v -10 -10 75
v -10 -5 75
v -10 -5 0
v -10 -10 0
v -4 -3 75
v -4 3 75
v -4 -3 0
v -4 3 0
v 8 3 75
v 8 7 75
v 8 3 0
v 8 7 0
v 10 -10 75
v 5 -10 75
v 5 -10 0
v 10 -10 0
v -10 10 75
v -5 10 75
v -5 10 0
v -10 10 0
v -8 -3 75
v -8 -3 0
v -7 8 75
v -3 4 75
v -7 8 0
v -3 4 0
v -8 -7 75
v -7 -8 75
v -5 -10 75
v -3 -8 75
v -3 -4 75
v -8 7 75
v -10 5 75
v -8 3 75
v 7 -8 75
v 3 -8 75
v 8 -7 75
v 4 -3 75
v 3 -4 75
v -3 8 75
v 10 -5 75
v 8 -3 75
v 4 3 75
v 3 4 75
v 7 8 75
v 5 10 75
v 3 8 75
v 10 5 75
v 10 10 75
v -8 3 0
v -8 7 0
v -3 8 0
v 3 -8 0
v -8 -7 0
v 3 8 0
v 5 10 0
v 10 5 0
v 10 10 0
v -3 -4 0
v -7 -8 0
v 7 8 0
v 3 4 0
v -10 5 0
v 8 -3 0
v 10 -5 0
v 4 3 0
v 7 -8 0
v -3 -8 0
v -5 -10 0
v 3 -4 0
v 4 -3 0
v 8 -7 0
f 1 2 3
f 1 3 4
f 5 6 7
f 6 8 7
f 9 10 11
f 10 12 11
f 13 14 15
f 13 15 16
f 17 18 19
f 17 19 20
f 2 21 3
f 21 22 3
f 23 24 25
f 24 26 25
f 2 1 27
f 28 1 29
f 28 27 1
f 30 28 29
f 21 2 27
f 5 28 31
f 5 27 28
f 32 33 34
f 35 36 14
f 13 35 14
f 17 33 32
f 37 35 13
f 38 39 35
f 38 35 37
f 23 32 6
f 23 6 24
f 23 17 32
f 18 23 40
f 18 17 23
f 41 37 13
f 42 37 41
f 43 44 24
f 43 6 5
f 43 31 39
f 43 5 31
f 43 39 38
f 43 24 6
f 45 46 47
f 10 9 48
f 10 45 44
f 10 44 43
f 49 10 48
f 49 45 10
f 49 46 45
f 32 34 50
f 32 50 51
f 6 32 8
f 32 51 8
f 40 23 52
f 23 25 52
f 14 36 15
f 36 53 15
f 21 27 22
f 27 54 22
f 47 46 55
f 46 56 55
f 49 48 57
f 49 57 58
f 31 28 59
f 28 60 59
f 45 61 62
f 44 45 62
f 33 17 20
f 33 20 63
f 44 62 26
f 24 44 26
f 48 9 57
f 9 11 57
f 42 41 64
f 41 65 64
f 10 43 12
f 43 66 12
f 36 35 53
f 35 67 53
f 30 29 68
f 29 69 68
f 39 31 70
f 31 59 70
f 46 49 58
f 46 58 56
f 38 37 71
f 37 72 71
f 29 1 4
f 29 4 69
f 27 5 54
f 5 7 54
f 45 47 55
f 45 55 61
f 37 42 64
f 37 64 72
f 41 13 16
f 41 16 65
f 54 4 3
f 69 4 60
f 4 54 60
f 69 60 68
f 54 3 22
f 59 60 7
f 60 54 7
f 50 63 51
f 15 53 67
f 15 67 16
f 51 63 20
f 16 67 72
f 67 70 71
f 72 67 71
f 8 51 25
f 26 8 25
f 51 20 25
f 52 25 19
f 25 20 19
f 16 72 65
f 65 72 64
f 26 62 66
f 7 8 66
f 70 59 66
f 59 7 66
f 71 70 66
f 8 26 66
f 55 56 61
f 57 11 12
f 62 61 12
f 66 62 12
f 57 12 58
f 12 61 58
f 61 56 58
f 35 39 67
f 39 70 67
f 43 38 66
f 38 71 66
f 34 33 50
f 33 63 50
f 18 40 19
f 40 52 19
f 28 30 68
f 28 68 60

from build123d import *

# Parameters (mm, degrees)
F1_DEPTH = 50
F2_DEPTH = 25


with BuildPart() as f1:
    # F0 (on Top) → F1 (new body)
    with BuildSketch(Plane.XY):
        Polygon((4, 3), (4, 4), (3, 4), (-3, 4), (-4, 4), (-4, 3), (-4, -3), (-4, -4), (-3, -4), (3, -4), (4, -4), (4, -3), align=None)
        Polygon((-8, -3), (-10, -5), (-10, -10), (-4, -4), (-4, -3), (-8, -7), align=None)
        Polygon((-10, -10), (-5, -10), (-3, -8), (-7, -8), (-3, -4), (-4, -4), align=None)
        Polygon((5, -10), (10, -10), (4, -4), (3, -4), (7, -8), (3, -8), align=None)
        Polygon((10, -10), (10, -5), (8, -3), (8, -7), (4, -3), (4, -4), align=None)
        Polygon((10, 5), (10, 10), (4, 4), (4, 3), (8, 7), (8, 3), align=None)
        Polygon((4, 4), (10, 10), (5, 10), (3, 8), (7, 8), (3, 4), align=None)
        Polygon((-3, 8), (-5, 10), (-10, 10), (-4, 4), (-3, 4), (-7, 8), align=None)
        Polygon((-4, 4), (-10, 10), (-10, 5), (-8, 3), (-8, 7), (-4, 3), align=None)
    extrude(amount=F1_DEPTH)

    # F2 (add): a face of the model
    f2_faces = [f1.faces().sort_by_distance(p)[0] for p in [
        (0, 0, 50),
    ]]
    extrude(f2_faces, amount=F2_DEPTH)


solid = f1.part
